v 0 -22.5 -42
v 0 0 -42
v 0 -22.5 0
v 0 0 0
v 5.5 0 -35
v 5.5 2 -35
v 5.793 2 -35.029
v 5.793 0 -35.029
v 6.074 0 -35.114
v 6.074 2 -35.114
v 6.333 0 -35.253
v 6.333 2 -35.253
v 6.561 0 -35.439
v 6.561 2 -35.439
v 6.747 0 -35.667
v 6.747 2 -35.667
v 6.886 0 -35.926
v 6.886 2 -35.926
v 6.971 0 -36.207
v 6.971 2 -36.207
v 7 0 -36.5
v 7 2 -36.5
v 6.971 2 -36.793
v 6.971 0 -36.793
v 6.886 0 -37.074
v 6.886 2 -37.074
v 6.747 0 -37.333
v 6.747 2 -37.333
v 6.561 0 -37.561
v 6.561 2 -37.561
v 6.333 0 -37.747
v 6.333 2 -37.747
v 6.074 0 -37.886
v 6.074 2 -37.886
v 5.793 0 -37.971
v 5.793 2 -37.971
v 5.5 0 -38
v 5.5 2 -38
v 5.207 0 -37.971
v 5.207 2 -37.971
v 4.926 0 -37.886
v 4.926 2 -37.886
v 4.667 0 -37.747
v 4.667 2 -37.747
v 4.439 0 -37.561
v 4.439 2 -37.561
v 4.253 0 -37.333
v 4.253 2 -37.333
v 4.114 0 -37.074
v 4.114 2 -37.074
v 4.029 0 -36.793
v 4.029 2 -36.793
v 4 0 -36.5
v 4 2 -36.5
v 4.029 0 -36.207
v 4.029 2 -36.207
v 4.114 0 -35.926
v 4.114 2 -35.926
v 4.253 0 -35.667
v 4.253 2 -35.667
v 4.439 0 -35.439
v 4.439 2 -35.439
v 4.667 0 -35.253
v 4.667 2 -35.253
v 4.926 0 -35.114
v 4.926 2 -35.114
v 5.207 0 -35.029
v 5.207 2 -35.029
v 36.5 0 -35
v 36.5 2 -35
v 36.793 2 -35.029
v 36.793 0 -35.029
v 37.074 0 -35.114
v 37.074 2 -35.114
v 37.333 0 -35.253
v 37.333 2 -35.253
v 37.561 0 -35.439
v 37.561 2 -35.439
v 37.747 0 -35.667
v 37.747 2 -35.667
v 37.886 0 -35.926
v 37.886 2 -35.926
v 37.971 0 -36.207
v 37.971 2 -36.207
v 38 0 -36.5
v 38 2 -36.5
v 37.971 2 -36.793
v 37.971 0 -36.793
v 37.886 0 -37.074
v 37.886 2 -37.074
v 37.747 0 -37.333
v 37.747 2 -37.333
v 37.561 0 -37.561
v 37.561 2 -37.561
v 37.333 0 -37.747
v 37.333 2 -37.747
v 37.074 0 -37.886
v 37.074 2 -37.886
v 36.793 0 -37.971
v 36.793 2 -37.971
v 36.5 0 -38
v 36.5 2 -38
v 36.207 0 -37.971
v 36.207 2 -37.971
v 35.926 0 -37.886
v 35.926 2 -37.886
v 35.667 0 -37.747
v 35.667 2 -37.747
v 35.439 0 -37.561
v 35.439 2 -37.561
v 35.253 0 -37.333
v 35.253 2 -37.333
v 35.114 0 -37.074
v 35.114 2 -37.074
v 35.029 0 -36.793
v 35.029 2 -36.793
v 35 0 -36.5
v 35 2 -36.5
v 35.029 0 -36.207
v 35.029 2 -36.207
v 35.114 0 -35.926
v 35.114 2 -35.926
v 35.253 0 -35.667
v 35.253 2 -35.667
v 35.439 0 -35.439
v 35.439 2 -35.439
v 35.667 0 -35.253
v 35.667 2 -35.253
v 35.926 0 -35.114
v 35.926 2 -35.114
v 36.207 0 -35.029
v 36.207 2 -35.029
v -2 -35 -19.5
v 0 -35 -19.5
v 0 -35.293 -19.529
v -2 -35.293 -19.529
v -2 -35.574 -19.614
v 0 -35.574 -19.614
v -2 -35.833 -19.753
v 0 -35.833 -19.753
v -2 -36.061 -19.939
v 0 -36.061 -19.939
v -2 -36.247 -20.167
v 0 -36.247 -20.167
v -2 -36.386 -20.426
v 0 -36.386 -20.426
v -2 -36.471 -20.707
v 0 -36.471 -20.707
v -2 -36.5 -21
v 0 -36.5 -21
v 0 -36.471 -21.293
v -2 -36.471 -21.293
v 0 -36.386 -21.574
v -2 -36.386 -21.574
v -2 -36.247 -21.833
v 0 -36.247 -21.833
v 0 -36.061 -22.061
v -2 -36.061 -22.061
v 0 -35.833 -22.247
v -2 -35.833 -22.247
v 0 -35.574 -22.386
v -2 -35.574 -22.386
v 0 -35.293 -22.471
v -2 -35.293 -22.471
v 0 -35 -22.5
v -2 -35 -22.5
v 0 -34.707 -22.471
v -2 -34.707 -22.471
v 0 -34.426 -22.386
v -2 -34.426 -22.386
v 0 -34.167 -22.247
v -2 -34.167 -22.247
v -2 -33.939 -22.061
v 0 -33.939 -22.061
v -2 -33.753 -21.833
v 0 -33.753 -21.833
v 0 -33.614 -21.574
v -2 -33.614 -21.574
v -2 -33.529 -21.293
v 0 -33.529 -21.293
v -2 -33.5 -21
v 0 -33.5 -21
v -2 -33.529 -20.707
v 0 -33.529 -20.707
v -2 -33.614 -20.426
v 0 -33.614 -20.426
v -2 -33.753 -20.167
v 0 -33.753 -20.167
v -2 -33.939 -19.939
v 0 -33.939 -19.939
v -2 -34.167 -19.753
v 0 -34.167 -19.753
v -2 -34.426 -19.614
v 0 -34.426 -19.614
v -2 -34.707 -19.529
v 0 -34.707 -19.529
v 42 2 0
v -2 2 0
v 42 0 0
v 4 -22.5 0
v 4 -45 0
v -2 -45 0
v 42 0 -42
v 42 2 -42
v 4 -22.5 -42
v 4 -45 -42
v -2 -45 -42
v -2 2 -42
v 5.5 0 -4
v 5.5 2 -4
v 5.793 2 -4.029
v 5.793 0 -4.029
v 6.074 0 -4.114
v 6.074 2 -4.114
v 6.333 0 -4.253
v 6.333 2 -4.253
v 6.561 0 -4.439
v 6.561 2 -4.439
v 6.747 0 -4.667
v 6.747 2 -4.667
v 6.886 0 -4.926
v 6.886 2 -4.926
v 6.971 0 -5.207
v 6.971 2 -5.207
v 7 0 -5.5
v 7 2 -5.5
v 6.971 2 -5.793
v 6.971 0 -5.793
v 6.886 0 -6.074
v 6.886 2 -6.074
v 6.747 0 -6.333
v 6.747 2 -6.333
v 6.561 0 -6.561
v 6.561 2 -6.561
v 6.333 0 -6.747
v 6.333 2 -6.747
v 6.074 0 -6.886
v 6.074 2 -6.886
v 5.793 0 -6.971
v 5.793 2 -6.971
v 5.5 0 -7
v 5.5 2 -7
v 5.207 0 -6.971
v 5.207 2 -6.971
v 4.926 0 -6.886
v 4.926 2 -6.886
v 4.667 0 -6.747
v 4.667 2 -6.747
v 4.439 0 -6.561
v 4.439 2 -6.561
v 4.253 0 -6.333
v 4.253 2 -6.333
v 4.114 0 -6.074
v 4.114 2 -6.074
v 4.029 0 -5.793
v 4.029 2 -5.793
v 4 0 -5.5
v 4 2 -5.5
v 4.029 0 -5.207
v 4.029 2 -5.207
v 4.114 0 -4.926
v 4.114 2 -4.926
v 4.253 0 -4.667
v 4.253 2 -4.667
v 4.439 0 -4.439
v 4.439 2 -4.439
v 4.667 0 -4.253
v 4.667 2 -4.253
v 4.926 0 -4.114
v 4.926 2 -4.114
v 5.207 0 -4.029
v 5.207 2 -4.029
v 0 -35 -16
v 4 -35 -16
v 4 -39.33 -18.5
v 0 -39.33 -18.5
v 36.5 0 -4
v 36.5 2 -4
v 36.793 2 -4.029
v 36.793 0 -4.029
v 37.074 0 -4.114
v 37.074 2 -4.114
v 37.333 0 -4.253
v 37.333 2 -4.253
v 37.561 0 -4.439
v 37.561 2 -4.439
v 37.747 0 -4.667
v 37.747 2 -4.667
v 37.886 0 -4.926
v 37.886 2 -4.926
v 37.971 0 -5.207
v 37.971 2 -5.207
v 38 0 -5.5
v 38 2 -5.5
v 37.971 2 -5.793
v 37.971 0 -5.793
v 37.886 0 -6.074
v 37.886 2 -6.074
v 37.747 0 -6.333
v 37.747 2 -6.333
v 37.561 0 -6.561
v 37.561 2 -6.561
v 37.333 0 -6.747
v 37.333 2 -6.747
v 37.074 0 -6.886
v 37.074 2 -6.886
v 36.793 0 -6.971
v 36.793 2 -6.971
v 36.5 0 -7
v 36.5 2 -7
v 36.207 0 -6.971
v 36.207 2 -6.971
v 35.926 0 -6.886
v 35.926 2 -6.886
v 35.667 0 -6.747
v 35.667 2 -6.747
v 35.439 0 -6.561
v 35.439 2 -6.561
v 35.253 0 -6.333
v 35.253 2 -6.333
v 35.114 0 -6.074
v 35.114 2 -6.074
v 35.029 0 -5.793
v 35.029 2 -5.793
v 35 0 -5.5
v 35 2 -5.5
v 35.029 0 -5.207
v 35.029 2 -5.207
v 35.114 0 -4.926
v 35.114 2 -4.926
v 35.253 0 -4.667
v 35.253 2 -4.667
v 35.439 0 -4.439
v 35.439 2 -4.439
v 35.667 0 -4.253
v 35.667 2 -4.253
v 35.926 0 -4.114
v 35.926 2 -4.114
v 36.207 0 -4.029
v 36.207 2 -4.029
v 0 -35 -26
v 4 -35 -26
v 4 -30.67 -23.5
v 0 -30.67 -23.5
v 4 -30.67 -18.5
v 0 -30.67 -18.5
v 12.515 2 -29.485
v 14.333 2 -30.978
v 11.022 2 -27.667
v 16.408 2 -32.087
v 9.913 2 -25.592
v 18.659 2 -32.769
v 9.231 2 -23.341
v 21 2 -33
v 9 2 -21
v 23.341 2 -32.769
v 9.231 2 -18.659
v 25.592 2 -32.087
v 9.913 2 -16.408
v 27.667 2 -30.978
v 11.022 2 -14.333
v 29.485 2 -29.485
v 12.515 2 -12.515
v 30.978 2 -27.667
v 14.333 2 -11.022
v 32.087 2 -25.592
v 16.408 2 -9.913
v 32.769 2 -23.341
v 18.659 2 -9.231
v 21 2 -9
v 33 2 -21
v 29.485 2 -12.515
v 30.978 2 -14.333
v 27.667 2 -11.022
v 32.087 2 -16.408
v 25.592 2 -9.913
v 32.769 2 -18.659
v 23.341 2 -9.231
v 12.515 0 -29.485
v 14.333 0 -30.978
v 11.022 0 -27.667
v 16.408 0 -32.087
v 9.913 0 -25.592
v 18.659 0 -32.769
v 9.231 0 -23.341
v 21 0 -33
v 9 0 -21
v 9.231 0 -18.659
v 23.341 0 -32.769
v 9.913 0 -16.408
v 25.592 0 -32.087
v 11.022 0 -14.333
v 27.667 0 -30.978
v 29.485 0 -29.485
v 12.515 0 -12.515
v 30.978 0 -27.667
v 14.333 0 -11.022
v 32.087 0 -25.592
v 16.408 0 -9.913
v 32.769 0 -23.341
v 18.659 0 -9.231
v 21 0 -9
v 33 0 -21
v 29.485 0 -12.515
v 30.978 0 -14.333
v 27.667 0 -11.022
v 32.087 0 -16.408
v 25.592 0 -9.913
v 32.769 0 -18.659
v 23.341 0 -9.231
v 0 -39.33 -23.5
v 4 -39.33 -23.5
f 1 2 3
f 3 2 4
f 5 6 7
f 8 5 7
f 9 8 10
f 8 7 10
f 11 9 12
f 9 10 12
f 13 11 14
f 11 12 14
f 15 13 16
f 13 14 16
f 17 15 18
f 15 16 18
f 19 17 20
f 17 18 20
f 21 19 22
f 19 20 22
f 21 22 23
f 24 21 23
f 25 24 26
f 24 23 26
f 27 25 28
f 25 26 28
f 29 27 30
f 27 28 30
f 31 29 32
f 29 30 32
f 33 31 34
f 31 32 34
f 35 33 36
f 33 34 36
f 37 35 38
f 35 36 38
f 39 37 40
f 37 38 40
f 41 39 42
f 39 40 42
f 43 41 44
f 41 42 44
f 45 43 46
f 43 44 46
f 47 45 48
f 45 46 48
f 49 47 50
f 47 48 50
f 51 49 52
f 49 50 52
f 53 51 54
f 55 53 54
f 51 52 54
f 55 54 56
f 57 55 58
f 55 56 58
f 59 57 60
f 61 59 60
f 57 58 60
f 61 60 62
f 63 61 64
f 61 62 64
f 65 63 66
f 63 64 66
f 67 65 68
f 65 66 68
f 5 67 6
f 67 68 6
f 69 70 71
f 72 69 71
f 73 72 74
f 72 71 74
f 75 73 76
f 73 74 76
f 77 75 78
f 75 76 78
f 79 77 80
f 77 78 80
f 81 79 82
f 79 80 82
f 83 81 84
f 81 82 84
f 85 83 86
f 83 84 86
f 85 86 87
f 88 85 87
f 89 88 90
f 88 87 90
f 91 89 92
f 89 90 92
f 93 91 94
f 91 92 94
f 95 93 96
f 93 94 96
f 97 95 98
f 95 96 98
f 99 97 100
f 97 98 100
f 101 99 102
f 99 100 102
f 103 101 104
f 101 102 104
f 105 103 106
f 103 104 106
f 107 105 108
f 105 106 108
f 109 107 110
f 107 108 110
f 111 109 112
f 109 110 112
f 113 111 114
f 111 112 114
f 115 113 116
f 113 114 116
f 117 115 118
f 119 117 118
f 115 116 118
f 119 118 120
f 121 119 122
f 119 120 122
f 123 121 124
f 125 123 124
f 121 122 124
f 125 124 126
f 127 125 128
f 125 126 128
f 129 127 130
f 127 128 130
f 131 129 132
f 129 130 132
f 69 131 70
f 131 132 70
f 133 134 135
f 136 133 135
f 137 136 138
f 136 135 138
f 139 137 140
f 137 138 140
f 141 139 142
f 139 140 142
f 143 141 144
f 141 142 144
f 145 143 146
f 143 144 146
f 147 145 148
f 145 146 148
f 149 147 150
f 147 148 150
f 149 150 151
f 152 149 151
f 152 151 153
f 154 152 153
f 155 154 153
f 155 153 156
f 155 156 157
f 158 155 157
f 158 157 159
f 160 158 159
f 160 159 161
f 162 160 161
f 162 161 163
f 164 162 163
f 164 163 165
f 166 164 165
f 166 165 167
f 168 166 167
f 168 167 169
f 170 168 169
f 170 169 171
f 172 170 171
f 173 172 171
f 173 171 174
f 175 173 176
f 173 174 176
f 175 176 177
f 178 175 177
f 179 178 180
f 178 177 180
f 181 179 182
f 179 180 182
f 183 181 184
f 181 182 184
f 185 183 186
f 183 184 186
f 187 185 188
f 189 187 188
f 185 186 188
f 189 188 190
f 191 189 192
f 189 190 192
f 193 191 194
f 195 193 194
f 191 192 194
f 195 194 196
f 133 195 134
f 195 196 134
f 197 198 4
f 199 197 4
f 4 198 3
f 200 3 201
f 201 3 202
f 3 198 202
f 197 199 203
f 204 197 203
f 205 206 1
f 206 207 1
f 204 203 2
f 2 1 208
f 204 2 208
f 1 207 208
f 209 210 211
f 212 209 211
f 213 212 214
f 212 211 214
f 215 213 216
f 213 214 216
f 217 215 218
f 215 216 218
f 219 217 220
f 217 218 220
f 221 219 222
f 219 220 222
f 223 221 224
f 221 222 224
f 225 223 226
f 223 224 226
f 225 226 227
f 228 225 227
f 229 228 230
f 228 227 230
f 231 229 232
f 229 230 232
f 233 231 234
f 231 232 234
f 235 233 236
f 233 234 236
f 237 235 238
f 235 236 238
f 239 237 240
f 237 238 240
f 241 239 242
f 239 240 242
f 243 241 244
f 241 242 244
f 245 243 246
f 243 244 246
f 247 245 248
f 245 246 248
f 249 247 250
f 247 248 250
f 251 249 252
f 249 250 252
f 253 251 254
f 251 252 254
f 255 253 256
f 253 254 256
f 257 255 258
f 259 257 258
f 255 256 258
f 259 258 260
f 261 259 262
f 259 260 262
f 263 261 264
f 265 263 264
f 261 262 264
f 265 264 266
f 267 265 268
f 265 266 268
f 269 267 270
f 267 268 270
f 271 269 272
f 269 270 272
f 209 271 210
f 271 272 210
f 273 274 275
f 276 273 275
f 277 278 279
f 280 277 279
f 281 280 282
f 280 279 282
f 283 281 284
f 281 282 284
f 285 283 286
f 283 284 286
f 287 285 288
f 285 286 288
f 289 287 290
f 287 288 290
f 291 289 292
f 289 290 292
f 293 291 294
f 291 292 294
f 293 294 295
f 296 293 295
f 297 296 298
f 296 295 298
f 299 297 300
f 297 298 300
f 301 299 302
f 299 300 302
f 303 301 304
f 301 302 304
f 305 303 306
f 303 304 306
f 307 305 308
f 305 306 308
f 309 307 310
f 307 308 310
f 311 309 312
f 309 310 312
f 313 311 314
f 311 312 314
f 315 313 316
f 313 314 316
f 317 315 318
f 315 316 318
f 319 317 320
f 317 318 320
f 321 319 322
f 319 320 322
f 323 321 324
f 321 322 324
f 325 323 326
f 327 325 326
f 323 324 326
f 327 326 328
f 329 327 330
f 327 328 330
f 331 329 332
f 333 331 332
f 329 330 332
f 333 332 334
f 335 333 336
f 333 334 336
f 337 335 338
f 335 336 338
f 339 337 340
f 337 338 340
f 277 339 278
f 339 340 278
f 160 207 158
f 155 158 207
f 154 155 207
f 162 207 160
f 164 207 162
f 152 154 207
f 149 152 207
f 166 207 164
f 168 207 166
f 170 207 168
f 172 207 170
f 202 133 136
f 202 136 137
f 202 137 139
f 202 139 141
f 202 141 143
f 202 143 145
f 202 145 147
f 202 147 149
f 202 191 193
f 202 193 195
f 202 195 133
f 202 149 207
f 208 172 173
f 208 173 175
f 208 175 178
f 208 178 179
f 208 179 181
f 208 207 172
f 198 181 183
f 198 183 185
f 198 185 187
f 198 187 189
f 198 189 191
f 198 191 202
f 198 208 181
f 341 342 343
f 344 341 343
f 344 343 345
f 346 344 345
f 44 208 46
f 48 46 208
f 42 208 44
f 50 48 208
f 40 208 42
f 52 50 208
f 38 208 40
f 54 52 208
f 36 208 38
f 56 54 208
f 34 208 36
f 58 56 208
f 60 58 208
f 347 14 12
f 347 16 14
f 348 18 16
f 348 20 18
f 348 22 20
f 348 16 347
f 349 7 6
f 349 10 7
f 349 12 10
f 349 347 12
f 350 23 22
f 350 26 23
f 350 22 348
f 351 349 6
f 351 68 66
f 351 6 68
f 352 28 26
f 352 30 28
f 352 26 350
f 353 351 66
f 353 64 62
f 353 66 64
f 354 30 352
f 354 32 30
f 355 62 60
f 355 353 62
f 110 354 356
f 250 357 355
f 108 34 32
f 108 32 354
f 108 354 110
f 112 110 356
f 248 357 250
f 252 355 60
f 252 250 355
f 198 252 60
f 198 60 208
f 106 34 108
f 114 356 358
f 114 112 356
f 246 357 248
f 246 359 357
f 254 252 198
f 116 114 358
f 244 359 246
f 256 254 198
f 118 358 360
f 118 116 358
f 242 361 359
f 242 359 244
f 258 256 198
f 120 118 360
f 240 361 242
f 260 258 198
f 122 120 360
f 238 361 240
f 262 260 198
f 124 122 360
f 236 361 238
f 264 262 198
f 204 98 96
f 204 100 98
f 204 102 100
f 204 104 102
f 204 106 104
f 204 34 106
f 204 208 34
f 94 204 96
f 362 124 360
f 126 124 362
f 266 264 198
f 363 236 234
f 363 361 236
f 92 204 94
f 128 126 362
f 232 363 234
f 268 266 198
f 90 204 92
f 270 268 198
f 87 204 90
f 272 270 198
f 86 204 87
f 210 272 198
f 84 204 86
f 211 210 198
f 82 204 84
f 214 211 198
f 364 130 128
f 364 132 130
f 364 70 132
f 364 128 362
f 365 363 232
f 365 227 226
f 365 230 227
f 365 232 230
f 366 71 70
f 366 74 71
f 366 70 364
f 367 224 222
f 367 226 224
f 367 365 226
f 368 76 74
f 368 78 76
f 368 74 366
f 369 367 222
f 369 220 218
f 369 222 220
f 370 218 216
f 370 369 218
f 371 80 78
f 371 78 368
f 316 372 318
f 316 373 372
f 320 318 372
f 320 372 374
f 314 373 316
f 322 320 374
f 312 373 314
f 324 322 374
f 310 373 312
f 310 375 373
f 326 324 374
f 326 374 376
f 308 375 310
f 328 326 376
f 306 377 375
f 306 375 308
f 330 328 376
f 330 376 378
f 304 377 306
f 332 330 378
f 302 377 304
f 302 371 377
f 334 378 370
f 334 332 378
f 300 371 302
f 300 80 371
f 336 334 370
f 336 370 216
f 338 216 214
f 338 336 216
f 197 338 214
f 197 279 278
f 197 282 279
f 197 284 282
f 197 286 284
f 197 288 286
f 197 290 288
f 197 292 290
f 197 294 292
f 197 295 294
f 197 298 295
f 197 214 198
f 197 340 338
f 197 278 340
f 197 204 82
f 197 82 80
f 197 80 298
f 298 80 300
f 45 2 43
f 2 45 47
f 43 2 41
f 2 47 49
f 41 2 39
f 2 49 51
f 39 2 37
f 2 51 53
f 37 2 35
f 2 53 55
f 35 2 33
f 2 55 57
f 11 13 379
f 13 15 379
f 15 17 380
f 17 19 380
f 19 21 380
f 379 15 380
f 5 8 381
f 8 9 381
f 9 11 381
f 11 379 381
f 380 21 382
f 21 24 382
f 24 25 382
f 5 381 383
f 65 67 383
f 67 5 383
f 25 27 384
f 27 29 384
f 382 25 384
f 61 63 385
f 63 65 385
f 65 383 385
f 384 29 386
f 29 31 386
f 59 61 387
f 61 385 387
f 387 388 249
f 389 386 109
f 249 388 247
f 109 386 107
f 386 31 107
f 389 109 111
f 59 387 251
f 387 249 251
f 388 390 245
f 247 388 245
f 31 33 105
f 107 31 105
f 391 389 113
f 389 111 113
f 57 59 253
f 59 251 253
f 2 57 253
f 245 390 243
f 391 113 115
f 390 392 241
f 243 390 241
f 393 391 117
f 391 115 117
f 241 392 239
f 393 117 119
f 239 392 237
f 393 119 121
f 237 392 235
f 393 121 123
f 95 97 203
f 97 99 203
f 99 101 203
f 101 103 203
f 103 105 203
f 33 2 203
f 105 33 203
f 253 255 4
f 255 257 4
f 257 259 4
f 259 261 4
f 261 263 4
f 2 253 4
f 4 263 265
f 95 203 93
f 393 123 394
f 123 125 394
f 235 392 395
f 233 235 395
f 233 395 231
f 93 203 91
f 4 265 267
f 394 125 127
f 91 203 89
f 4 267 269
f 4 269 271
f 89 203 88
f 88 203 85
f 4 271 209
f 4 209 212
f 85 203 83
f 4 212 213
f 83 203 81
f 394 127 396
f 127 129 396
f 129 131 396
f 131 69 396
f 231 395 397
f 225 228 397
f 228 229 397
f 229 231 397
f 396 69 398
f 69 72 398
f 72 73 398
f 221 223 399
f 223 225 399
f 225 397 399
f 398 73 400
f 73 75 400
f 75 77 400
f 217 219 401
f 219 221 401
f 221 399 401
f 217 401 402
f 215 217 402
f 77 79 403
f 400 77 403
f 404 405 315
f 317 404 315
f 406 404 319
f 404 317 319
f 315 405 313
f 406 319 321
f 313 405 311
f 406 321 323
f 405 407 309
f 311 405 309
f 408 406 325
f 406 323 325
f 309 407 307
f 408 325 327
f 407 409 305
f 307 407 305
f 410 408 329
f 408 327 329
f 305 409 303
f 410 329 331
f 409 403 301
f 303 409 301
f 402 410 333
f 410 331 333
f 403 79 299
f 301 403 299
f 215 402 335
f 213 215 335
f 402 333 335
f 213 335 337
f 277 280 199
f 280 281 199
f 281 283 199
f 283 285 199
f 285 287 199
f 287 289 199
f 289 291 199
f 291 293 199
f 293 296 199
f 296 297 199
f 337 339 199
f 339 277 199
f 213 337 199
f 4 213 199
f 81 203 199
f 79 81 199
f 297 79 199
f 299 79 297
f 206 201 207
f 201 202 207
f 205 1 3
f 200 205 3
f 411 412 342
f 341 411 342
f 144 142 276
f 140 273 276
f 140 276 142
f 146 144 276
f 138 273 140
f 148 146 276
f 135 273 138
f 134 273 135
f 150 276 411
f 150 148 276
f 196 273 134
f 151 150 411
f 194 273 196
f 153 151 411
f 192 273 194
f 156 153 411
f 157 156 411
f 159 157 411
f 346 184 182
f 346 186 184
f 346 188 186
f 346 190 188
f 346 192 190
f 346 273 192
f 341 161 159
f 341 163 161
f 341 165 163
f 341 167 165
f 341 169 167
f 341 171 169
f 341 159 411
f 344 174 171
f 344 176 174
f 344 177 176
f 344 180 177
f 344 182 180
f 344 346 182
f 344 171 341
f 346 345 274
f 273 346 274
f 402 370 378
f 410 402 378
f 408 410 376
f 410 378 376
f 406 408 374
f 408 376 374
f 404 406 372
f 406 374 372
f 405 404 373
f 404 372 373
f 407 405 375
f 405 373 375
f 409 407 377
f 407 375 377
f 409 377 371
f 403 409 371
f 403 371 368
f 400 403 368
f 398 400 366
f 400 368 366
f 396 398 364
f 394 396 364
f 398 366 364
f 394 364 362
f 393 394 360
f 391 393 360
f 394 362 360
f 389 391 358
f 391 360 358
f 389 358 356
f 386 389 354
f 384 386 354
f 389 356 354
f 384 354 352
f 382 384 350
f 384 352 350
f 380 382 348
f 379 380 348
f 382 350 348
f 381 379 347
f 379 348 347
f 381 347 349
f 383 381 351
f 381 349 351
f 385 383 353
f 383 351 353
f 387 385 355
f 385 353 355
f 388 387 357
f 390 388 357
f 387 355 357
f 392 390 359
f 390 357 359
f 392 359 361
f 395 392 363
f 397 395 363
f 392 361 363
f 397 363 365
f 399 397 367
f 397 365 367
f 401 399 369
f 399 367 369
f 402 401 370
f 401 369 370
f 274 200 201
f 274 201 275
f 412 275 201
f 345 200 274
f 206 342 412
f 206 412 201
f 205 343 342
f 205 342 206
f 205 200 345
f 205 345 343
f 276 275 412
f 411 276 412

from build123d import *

# Parameters (mm, degrees)
SKETCH_1_W          = 42
SKETCH_1_H          = 42
EXTRUDE_1_DEPTH     = 2
SKETCH_2_R          = 12
SKETCH_2_R_2        = 1.5
CUT_EXTRUDE_1_DEPTH = 2
SKETCH_3_W          = 42
SKETCH_3_H          = 2
EXTRUDE_3_DEPTH     = 2
SKETCH_4_W          = 2
SKETCH_4_H          = 42
EXTRUDE_4_DEPTH     = 45
EXTRUDE_5_DEPTH     = 4
CUT_EXTRUDE_2_DEPTH = 4
CUT_EXTRUDE_3_DEPTH = 4


with BuildPart() as part:
    # 草图1 → 凸台-拉伸1 (new body)
    with BuildSketch(Plane(origin=(0, 0, 0), x_dir=(1, 0, 0), z_dir=(0, 1, 0))):
        with Locations((21, 21)):
            Rectangle(SKETCH_1_W, SKETCH_1_H)
    extrude(amount=EXTRUDE_1_DEPTH)

    # 草图2 → 切除-拉伸1 (cut)
    with BuildSketch(Plane(origin=(0, 2, 0), x_dir=(1, 0, 0), z_dir=(0, 1, 0))):
        with Locations(Location((21, 21, 0), (0, 0, 270))):
            Circle(SKETCH_2_R)
        with Locations(Location((36.5, 36.5, 0), (0, 0, 270))):
            Circle(SKETCH_2_R_2)
        with Locations(Location((36.5, 5.5, 0), (0, 0, 270))):
            Circle(SKETCH_2_R_2)
        with Locations(Location((5.5, 5.5, 0), (0, 0, 270))):
            Circle(SKETCH_2_R_2)
        with Locations(Location((5.5, 36.5, 0), (0, 0, 270))):
            Circle(SKETCH_2_R_2)
    extrude(amount=-CUT_EXTRUDE_1_DEPTH, mode=Mode.SUBTRACT)

    # 草图3 → 凸台-拉伸3 (add)
    with BuildSketch(Plane.ZY):
        with Locations((-21, 1)):
            Rectangle(SKETCH_3_W, SKETCH_3_H)
    extrude(amount=EXTRUDE_3_DEPTH)

    # 草图4 → 凸台-拉伸4 (add)
    with BuildSketch(Plane.XZ):
        with Locations((-1, -21)):
            Rectangle(SKETCH_4_W, SKETCH_4_H)
    extrude(amount=EXTRUDE_4_DEPTH)

    # 草图5 → 凸台-拉伸5 (add)
    with BuildSketch(Plane(origin=(0, 0, 0), x_dir=(0, 0, -1), z_dir=(1, 0, 0))):
        Polygon((0, -22.5), (0, -45), (42, -45), (42, -22.5), (21, -22.5), align=None)
    extrude(amount=EXTRUDE_5_DEPTH)

    # 草图6 → 切除-拉伸2 (cut)
    with BuildSketch(Plane(origin=(4, 0, 0), x_dir=(0, 0, -1), z_dir=(1, 0, 0))):
        Polygon((26, -35), (23.5, -30.669872981), (18.5, -30.669872981), (16, -35), (18.5, -39.330127019), (23.5, -39.330127019), align=None)
    extrude(amount=-CUT_EXTRUDE_2_DEPTH, mode=Mode.SUBTRACT)

    # 草图7 → 切除-拉伸3 (cut)
    with BuildSketch(Plane(origin=(0, 0, 0), x_dir=(0, 0, -1), z_dir=(1, 0, 0))):
        with BuildLine():
            ThreePointArc((22.5, -35), (21, -33.5), (19.5, -35))
            Line((19.5, -35), (22.5, -35))
        make_face()
        with BuildLine():
            Line((22.5, -35), (19.5, -35))
            ThreePointArc((19.5, -35), (21, -36.5), (22.5, -35))
        make_face()
    extrude(amount=-CUT_EXTRUDE_3_DEPTH, mode=Mode.SUBTRACT)


solid = part.part
